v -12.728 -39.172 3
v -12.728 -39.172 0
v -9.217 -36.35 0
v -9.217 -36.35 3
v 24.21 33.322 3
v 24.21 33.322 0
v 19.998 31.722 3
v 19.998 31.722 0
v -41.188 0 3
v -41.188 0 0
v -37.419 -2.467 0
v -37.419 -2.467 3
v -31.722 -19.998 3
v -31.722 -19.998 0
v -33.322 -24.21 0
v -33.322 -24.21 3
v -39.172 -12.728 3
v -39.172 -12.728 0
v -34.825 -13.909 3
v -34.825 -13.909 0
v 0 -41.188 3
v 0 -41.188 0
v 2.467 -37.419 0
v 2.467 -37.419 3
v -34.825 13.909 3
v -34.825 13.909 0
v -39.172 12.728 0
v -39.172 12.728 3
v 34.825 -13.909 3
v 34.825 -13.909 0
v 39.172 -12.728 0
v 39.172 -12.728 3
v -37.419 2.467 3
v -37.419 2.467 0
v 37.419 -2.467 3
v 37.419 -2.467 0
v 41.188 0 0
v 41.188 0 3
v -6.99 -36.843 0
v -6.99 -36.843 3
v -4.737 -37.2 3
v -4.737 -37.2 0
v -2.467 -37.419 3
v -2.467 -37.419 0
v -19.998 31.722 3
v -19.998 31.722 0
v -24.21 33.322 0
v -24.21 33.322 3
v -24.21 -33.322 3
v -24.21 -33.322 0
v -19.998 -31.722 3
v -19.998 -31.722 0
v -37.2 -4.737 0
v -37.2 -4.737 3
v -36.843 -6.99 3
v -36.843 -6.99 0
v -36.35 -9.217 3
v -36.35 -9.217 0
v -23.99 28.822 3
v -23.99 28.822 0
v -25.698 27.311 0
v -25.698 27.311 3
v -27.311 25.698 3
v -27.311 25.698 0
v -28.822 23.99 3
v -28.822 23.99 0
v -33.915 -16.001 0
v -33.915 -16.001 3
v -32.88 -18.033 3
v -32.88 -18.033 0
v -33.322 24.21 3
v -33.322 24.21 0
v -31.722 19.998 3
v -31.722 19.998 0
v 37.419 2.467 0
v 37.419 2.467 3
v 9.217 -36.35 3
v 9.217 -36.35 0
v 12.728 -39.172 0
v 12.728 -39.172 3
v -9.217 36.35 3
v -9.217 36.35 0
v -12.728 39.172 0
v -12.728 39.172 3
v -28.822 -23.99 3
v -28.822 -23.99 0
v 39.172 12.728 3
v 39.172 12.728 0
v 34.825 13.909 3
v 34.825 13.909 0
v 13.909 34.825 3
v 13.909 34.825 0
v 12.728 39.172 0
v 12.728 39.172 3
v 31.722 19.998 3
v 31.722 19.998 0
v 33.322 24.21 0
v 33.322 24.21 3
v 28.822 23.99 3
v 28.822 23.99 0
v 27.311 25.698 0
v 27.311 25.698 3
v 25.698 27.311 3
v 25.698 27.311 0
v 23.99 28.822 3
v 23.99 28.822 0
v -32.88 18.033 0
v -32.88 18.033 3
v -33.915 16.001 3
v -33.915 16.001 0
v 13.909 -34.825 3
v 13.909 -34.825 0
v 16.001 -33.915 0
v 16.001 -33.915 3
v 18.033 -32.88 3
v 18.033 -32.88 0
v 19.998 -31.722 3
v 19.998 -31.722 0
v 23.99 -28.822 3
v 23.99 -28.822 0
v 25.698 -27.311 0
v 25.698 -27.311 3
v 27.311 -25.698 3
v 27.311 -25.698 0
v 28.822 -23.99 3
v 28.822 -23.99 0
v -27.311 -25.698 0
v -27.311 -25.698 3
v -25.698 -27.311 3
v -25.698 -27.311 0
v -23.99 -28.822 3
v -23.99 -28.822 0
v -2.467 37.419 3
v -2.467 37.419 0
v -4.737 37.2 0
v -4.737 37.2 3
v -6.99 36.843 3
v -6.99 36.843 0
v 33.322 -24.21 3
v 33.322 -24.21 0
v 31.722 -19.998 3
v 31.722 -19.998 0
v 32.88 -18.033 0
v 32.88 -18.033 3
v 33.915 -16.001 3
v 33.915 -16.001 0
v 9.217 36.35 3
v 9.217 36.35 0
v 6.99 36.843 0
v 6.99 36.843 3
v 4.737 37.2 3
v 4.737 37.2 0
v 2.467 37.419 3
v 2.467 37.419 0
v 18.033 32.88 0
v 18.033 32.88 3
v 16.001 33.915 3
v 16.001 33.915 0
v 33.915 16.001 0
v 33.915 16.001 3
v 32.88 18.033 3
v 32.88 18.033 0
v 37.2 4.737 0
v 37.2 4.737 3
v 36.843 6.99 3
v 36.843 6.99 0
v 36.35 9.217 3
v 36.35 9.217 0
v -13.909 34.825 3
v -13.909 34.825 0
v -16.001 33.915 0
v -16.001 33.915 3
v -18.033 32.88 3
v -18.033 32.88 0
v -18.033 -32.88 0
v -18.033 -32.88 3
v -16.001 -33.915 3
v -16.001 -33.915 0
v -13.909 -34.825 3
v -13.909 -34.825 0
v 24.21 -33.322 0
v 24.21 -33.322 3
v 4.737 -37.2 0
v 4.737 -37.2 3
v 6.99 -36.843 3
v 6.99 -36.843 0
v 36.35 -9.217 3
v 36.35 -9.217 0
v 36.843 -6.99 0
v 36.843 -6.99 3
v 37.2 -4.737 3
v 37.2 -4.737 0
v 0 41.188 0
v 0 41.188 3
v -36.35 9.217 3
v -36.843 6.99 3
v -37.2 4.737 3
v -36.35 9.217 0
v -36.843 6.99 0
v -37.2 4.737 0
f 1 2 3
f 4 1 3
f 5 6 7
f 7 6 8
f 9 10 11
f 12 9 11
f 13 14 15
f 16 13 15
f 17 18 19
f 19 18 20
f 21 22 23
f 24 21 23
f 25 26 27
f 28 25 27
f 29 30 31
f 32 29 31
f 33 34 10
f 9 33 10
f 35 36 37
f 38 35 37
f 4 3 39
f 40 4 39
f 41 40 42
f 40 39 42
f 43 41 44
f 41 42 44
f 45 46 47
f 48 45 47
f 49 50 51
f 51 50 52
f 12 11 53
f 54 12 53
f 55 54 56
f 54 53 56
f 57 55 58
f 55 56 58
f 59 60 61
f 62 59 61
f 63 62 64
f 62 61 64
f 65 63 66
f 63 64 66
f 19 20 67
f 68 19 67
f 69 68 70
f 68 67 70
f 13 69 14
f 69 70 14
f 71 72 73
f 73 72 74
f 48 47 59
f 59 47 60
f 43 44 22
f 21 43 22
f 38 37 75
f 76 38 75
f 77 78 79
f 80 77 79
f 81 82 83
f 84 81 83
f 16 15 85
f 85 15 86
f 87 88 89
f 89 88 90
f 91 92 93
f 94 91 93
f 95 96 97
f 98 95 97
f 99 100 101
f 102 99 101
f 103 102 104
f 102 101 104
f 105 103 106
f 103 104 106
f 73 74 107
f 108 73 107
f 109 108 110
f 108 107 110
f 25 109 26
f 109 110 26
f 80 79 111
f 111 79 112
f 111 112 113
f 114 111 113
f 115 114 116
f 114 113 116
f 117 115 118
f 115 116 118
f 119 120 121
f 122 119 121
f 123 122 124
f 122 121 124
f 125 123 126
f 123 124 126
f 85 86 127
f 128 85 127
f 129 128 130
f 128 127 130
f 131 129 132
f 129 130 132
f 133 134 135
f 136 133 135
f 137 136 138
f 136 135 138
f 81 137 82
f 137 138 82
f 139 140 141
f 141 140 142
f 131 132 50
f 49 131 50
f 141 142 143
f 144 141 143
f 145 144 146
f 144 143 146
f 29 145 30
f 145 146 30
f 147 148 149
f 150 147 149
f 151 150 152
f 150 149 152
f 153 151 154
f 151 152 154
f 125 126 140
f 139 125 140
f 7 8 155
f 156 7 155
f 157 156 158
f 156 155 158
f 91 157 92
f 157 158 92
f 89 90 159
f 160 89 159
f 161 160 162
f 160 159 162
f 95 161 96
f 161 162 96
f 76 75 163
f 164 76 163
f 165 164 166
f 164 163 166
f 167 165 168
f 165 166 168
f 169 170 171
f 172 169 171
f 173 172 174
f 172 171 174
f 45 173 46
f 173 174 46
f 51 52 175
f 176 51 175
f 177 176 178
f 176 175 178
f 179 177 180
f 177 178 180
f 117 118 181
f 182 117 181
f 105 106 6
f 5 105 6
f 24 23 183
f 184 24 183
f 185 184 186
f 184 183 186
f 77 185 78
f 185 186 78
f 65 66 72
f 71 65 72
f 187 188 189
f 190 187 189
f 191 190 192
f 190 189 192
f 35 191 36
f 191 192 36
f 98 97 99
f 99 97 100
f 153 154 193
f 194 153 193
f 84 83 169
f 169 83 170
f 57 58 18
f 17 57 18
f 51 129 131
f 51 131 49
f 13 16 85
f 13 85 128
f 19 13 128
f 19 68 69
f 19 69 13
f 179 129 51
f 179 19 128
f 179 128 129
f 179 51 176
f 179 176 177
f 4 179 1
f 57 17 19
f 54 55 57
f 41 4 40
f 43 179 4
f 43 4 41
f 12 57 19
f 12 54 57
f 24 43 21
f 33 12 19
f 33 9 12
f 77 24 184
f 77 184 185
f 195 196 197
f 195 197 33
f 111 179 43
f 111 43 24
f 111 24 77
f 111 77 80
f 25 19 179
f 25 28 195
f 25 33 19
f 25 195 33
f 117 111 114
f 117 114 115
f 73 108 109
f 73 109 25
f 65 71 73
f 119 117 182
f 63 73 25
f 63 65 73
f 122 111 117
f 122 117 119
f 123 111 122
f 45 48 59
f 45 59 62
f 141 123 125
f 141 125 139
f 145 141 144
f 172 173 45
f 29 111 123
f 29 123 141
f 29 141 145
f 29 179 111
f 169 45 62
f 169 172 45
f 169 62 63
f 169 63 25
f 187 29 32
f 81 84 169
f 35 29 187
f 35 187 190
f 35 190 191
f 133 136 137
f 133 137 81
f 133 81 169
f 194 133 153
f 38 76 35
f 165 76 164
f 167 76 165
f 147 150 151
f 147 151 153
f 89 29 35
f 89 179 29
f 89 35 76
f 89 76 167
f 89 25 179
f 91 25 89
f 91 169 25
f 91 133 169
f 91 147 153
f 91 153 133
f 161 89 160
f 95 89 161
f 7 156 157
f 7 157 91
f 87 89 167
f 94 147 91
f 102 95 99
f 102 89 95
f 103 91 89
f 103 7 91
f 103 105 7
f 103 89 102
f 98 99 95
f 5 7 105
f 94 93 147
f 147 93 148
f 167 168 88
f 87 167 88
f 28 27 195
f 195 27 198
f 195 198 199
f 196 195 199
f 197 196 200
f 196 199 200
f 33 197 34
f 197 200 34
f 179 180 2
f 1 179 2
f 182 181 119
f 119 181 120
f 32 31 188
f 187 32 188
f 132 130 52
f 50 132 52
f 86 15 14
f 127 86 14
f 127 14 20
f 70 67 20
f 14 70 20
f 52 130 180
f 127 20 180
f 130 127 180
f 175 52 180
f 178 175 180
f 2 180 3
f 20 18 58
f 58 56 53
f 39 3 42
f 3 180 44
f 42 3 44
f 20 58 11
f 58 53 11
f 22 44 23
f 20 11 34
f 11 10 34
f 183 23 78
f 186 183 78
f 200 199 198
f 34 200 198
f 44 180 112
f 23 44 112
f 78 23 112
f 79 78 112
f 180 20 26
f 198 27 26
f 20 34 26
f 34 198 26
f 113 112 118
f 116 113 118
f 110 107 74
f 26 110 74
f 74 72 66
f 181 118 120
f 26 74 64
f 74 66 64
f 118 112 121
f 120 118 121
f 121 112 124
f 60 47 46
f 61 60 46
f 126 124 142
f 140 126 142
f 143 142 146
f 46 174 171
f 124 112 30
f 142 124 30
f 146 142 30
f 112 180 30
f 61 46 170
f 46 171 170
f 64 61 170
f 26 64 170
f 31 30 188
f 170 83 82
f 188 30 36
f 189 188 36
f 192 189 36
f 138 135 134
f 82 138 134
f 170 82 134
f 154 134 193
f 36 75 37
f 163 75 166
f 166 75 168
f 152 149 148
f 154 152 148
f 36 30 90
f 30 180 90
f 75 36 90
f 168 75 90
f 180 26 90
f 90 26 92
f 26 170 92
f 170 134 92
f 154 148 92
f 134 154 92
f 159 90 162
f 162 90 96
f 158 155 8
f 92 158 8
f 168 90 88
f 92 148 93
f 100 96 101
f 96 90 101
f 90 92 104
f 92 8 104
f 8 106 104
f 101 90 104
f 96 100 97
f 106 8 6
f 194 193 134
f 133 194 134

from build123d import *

# Parameters (mm, degrees)
F1_DEPTH = 3


with BuildPart() as f1:
    # F0 (on Top) → F1 (new body)
    with BuildSketch(Plane.XY):
        with BuildLine():
            ThreePointArc((37.418773, -2.466863), (37.479688, -1.2341), (37.5, 0))
            ThreePointArc((37.5, 0), (37.479688, 1.2341), (37.418773, 2.466863))
            ThreePointArc((37.418773, 2.466863), (37.038313, 5.866292), (36.349671, 9.21691))
            ThreePointArc((36.349671, 9.21691), (35.664619, 11.588137), (34.825065, 13.909163))
            ThreePointArc((34.825065, 13.909163), (33.412745, 17.024644), (31.722409, 19.998469))
            ThreePointArc((31.722409, 19.998469), (30.338137, 22.041947), (28.822438, 23.989937))
            ThreePointArc((28.822438, 23.989937), (26.516504, 26.516504), (23.989937, 28.822438))
            ThreePointArc((23.989937, 28.822438), (22.041947, 30.338137), (19.998469, 31.722409))
            ThreePointArc((19.998469, 31.722409), (17.024644, 33.412745), (13.909163, 34.825065))
            ThreePointArc((13.909163, 34.825065), (11.588137, 35.664619), (9.21691, 36.349671))
            ThreePointArc((9.21691, 36.349671), (5.866292, 37.038313), (2.466863, 37.418773))
            ThreePointArc((2.466863, 37.418773), (0, 37.5), (-2.466863, 37.418773))
            ThreePointArc((-2.466863, 37.418773), (-5.866292, 37.038313), (-9.21691, 36.349671))
            ThreePointArc((-9.21691, 36.349671), (-11.588137, 35.664619), (-13.909163, 34.825065))
            ThreePointArc((-13.909163, 34.825065), (-17.024644, 33.412745), (-19.998469, 31.722409))
            ThreePointArc((-19.998469, 31.722409), (-22.041947, 30.338137), (-23.989937, 28.822438))
            ThreePointArc((-23.989937, 28.822438), (-26.516504, 26.516504), (-28.822438, 23.989937))
            ThreePointArc((-28.822438, 23.989937), (-30.338137, 22.041947), (-31.722409, 19.998469))
            ThreePointArc((-31.722409, 19.998469), (-33.412745, 17.024644), (-34.825065, 13.909163))
            ThreePointArc((-34.825065, 13.909163), (-35.664619, 11.588137), (-36.349671, 9.21691))
            ThreePointArc((-36.349671, 9.21691), (-37.038313, 5.866292), (-37.418773, 2.466863))
            ThreePointArc((-37.418773, 2.466863), (-37.5, 0), (-37.418773, -2.466863))
            ThreePointArc((-37.418773, -2.466863), (-37.038313, -5.866292), (-36.349671, -9.21691))
            ThreePointArc((-36.349671, -9.21691), (-35.664619, -11.588137), (-34.825065, -13.909163))
            ThreePointArc((-34.825065, -13.909163), (-33.412745, -17.024644), (-31.722409, -19.998469))
            ThreePointArc((-31.722409, -19.998469), (-30.338137, -22.041947), (-28.822438, -23.989937))
            ThreePointArc((-28.822438, -23.989937), (-26.516504, -26.516504), (-23.989937, -28.822438))
            ThreePointArc((-23.989937, -28.822438), (-22.041947, -30.338137), (-19.998469, -31.722409))
            ThreePointArc((-19.998469, -31.722409), (-17.024644, -33.412745), (-13.909163, -34.825065))
            ThreePointArc((-13.909163, -34.825065), (-11.588137, -35.664619), (-9.21691, -36.349671))
            ThreePointArc((-9.21691, -36.349671), (-5.866292, -37.038313), (-2.466863, -37.418773))
            ThreePointArc((-2.466863, -37.418773), (0, -37.5), (2.466863, -37.418773))
            ThreePointArc((2.466863, -37.418773), (5.866292, -37.038313), (9.21691, -36.349671))
            ThreePointArc((9.21691, -36.349671), (11.588137, -35.664619), (13.909163, -34.825065))
            ThreePointArc((13.909163, -34.825065), (17.024644, -33.412745), (19.998469, -31.722409))
            ThreePointArc((19.998469, -31.722409), (22.041947, -30.338137), (23.989937, -28.822438))
            ThreePointArc((23.989937, -28.822438), (26.516504, -26.516504), (28.822438, -23.989937))
            ThreePointArc((28.822438, -23.989937), (30.338137, -22.041947), (31.722409, -19.998469))
            ThreePointArc((31.722409, -19.998469), (33.412745, -17.024644), (34.825065, -13.909163))
            ThreePointArc((34.825065, -13.909163), (35.664619, -11.588137), (36.349671, -9.21691))
            ThreePointArc((36.349671, -9.21691), (37.038313, -5.866292), (37.418773, -2.466863))
        make_face()
        with BuildLine():
            ThreePointArc((37.418773, 2.466863), (37.479688, 1.2341), (37.5, 0))
            ThreePointArc((37.5, 0), (37.479688, -1.2341), (37.418773, -2.466863))
            Line((37.418773, -2.466863), (41.188397, 0))
            Line((41.188397, 0), (37.418773, 2.466863))
        make_face()
        with BuildLine():
            ThreePointArc((34.825065, 13.909163), (35.664619, 11.588137), (36.349671, 9.21691))
            Line((36.349671, 9.21691), (39.172493, 12.727915))
            Line((39.172493, 12.727915), (34.825065, 13.909163))
        make_face()
        with BuildLine():
            Line((39.172493, -12.727915), (36.349671, -9.21691))
            ThreePointArc((36.349671, -9.21691), (35.664619, -11.588137), (34.825065, -13.909163))
            Line((34.825065, -13.909163), (39.172493, -12.727915))
        make_face()
        with BuildLine():
            ThreePointArc((28.822438, 23.989937), (30.338137, 22.041947), (31.722409, 19.998469))
            Line((31.722409, 19.998469), (33.322113, 24.209932))
            Line((33.322113, 24.209932), (28.822438, 23.989937))
        make_face()
        with BuildLine():
            Line((33.322113, -24.209932), (31.722409, -19.998469))
            ThreePointArc((31.722409, -19.998469), (30.338137, -22.041947), (28.822438, -23.989937))
            Line((28.822438, -23.989937), (33.322113, -24.209932))
        make_face()
        with BuildLine():
            ThreePointArc((19.998469, 31.722409), (22.041947, 30.338137), (23.989937, 28.822438))
            Line((23.989937, 28.822438), (24.209932, 33.322113))
            Line((24.209932, 33.322113), (19.998469, 31.722409))
        make_face()
        with BuildLine():
            Line((24.209932, -33.322113), (23.989937, -28.822438))
            ThreePointArc((23.989937, -28.822438), (22.041947, -30.338137), (19.998469, -31.722409))
            Line((19.998469, -31.722409), (24.209932, -33.322113))
        make_face()
        with BuildLine():
            ThreePointArc((9.21691, 36.349671), (11.588137, 35.664619), (13.909163, 34.825065))
            Line((13.909163, 34.825065), (12.727915, 39.172493))
            Line((12.727915, 39.172493), (9.21691, 36.349671))
        make_face()
        with BuildLine():
            Line((12.727915, -39.172493), (13.909163, -34.825065))
            ThreePointArc((13.909163, -34.825065), (11.588137, -35.664619), (9.21691, -36.349671))
            Line((9.21691, -36.349671), (12.727915, -39.172493))
        make_face()
        with BuildLine():
            ThreePointArc((-2.466863, 37.418773), (0, 37.5), (2.466863, 37.418773))
            Line((2.466863, 37.418773), (0, 41.188397))
            Line((0, 41.188397), (-2.466863, 37.418773))
        make_face()
        with BuildLine():
            Line((0, -41.188397), (2.466863, -37.418773))
            ThreePointArc((2.466863, -37.418773), (0, -37.5), (-2.466863, -37.418773))
            Line((-2.466863, -37.418773), (0, -41.188397))
        make_face()
        with BuildLine():
            ThreePointArc((-13.909163, 34.825065), (-11.588137, 35.664619), (-9.21691, 36.349671))
            Line((-9.21691, 36.349671), (-12.727915, 39.172493))
            Line((-12.727915, 39.172493), (-13.909163, 34.825065))
        make_face()
        with BuildLine():
            Line((-12.727915, -39.172493), (-9.21691, -36.349671))
            ThreePointArc((-9.21691, -36.349671), (-11.588137, -35.664619), (-13.909163, -34.825065))
            Line((-13.909163, -34.825065), (-12.727915, -39.172493))
        make_face()
        with BuildLine():
            ThreePointArc((-23.989937, 28.822438), (-22.041947, 30.338137), (-19.998469, 31.722409))
            Line((-19.998469, 31.722409), (-24.209932, 33.322113))
            Line((-24.209932, 33.322113), (-23.989937, 28.822438))
        make_face()
        with BuildLine():
            Line((-24.209932, -33.322113), (-19.998469, -31.722409))
            ThreePointArc((-19.998469, -31.722409), (-22.041947, -30.338137), (-23.989937, -28.822438))
            Line((-23.989937, -28.822438), (-24.209932, -33.322113))
        make_face()
        with BuildLine():
            ThreePointArc((-31.722409, 19.998469), (-30.338137, 22.041947), (-28.822438, 23.989937))
            Line((-28.822438, 23.989937), (-33.322113, 24.209932))
            Line((-33.322113, 24.209932), (-31.722409, 19.998469))
        make_face()
        with BuildLine():
            Line((-33.322113, -24.209932), (-28.822438, -23.989937))
            ThreePointArc((-28.822438, -23.989937), (-30.338137, -22.041947), (-31.722409, -19.998469))
            Line((-31.722409, -19.998469), (-33.322113, -24.209932))
        make_face()
        with BuildLine():
            ThreePointArc((-36.349671, 9.21691), (-35.664619, 11.588137), (-34.825065, 13.909163))
            Line((-34.825065, 13.909163), (-39.172493, 12.727915))
            Line((-39.172493, 12.727915), (-36.349671, 9.21691))
        make_face()
        with BuildLine():
            Line((-39.172493, -12.727915), (-34.825065, -13.909163))
            ThreePointArc((-34.825065, -13.909163), (-35.664619, -11.588137), (-36.349671, -9.21691))
            Line((-36.349671, -9.21691), (-39.172493, -12.727915))
        make_face()
        with BuildLine():
            ThreePointArc((-37.418773, -2.466863), (-37.5, 0), (-37.418773, 2.466863))
            Line((-37.418773, 2.466863), (-41.188397, 0))
            Line((-41.188397, 0), (-37.418773, -2.466863))
        make_face()
    extrude(amount=F1_DEPTH)


solid = f1.part
